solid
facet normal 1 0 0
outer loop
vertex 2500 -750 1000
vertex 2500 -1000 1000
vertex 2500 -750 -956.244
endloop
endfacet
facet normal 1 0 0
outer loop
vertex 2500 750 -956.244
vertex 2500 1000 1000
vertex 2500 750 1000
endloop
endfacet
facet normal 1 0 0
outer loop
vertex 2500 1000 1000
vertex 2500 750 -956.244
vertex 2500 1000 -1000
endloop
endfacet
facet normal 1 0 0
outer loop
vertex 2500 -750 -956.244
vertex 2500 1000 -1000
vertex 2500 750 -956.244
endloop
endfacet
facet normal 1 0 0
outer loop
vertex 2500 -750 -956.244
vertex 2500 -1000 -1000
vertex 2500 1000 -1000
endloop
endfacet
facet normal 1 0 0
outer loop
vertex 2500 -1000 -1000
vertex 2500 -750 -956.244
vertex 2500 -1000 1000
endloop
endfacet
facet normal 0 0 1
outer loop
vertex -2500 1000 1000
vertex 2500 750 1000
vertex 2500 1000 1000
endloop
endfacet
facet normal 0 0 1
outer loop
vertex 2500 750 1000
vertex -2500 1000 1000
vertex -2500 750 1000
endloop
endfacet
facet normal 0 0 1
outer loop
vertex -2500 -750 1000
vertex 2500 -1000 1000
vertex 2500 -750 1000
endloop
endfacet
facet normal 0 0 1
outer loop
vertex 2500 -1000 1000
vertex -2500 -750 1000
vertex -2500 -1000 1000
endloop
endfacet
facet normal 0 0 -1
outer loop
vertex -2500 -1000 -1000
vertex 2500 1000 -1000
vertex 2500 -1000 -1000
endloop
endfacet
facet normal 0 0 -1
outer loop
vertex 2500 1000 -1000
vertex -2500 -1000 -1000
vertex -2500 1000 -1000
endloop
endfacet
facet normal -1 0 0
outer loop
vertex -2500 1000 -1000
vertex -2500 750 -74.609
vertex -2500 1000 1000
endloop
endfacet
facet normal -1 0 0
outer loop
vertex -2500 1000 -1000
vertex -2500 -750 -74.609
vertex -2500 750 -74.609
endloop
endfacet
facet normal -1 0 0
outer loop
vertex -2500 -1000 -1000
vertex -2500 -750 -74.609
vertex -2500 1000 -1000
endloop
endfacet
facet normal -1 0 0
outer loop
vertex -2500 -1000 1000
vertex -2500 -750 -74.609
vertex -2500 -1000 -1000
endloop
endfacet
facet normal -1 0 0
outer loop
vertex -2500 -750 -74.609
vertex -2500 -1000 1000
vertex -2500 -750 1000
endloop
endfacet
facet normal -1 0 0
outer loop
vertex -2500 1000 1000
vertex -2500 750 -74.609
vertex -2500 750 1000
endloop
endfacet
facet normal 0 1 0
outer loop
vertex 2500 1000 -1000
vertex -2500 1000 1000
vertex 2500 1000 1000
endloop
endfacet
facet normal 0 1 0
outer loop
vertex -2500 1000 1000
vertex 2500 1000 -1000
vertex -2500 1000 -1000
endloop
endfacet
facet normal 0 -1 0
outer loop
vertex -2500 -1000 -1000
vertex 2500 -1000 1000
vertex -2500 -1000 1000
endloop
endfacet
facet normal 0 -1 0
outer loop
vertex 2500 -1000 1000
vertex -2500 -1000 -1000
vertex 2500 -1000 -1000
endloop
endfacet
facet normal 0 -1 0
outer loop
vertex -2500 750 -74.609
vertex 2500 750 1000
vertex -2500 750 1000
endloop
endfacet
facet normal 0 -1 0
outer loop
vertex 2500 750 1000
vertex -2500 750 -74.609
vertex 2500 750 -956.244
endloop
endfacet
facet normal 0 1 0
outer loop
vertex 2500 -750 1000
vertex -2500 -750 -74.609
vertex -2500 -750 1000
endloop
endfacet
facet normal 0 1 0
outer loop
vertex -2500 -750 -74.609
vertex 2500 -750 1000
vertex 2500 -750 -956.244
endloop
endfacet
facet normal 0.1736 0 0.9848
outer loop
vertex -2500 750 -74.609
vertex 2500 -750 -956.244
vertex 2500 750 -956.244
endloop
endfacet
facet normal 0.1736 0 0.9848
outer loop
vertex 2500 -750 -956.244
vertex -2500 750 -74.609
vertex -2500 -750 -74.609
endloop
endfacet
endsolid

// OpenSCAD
module walled_ramp() { 
difference() { 
cube([5000,2000,2000],center=true);
translate([0,0,500]) rotate([0,10,0])cube([8000,1500,2000],center=true);
}
}
module block() {
    cube([5000,2000,900],center=true);
}

module ramp() { 
    difference() { 
cube([5000,2000,2000],center=true);
translate([0,0,500]) rotate([0,10,0]) cube([8000,3000,2000],center=true);
}
}
module low_walled_ramp() { 
    difference() { 
        walled_ramp();
       translate([0,0,800]) rotate([0,10,0]) cube([8000,3000,2000],center=true);
    }
}
        
walled_ramp();
//translate([-5000,0,-500]) block();
//translate([0,5000,0]) ramp();

//translate([0,-5000,0]) low_walled_ramp();
